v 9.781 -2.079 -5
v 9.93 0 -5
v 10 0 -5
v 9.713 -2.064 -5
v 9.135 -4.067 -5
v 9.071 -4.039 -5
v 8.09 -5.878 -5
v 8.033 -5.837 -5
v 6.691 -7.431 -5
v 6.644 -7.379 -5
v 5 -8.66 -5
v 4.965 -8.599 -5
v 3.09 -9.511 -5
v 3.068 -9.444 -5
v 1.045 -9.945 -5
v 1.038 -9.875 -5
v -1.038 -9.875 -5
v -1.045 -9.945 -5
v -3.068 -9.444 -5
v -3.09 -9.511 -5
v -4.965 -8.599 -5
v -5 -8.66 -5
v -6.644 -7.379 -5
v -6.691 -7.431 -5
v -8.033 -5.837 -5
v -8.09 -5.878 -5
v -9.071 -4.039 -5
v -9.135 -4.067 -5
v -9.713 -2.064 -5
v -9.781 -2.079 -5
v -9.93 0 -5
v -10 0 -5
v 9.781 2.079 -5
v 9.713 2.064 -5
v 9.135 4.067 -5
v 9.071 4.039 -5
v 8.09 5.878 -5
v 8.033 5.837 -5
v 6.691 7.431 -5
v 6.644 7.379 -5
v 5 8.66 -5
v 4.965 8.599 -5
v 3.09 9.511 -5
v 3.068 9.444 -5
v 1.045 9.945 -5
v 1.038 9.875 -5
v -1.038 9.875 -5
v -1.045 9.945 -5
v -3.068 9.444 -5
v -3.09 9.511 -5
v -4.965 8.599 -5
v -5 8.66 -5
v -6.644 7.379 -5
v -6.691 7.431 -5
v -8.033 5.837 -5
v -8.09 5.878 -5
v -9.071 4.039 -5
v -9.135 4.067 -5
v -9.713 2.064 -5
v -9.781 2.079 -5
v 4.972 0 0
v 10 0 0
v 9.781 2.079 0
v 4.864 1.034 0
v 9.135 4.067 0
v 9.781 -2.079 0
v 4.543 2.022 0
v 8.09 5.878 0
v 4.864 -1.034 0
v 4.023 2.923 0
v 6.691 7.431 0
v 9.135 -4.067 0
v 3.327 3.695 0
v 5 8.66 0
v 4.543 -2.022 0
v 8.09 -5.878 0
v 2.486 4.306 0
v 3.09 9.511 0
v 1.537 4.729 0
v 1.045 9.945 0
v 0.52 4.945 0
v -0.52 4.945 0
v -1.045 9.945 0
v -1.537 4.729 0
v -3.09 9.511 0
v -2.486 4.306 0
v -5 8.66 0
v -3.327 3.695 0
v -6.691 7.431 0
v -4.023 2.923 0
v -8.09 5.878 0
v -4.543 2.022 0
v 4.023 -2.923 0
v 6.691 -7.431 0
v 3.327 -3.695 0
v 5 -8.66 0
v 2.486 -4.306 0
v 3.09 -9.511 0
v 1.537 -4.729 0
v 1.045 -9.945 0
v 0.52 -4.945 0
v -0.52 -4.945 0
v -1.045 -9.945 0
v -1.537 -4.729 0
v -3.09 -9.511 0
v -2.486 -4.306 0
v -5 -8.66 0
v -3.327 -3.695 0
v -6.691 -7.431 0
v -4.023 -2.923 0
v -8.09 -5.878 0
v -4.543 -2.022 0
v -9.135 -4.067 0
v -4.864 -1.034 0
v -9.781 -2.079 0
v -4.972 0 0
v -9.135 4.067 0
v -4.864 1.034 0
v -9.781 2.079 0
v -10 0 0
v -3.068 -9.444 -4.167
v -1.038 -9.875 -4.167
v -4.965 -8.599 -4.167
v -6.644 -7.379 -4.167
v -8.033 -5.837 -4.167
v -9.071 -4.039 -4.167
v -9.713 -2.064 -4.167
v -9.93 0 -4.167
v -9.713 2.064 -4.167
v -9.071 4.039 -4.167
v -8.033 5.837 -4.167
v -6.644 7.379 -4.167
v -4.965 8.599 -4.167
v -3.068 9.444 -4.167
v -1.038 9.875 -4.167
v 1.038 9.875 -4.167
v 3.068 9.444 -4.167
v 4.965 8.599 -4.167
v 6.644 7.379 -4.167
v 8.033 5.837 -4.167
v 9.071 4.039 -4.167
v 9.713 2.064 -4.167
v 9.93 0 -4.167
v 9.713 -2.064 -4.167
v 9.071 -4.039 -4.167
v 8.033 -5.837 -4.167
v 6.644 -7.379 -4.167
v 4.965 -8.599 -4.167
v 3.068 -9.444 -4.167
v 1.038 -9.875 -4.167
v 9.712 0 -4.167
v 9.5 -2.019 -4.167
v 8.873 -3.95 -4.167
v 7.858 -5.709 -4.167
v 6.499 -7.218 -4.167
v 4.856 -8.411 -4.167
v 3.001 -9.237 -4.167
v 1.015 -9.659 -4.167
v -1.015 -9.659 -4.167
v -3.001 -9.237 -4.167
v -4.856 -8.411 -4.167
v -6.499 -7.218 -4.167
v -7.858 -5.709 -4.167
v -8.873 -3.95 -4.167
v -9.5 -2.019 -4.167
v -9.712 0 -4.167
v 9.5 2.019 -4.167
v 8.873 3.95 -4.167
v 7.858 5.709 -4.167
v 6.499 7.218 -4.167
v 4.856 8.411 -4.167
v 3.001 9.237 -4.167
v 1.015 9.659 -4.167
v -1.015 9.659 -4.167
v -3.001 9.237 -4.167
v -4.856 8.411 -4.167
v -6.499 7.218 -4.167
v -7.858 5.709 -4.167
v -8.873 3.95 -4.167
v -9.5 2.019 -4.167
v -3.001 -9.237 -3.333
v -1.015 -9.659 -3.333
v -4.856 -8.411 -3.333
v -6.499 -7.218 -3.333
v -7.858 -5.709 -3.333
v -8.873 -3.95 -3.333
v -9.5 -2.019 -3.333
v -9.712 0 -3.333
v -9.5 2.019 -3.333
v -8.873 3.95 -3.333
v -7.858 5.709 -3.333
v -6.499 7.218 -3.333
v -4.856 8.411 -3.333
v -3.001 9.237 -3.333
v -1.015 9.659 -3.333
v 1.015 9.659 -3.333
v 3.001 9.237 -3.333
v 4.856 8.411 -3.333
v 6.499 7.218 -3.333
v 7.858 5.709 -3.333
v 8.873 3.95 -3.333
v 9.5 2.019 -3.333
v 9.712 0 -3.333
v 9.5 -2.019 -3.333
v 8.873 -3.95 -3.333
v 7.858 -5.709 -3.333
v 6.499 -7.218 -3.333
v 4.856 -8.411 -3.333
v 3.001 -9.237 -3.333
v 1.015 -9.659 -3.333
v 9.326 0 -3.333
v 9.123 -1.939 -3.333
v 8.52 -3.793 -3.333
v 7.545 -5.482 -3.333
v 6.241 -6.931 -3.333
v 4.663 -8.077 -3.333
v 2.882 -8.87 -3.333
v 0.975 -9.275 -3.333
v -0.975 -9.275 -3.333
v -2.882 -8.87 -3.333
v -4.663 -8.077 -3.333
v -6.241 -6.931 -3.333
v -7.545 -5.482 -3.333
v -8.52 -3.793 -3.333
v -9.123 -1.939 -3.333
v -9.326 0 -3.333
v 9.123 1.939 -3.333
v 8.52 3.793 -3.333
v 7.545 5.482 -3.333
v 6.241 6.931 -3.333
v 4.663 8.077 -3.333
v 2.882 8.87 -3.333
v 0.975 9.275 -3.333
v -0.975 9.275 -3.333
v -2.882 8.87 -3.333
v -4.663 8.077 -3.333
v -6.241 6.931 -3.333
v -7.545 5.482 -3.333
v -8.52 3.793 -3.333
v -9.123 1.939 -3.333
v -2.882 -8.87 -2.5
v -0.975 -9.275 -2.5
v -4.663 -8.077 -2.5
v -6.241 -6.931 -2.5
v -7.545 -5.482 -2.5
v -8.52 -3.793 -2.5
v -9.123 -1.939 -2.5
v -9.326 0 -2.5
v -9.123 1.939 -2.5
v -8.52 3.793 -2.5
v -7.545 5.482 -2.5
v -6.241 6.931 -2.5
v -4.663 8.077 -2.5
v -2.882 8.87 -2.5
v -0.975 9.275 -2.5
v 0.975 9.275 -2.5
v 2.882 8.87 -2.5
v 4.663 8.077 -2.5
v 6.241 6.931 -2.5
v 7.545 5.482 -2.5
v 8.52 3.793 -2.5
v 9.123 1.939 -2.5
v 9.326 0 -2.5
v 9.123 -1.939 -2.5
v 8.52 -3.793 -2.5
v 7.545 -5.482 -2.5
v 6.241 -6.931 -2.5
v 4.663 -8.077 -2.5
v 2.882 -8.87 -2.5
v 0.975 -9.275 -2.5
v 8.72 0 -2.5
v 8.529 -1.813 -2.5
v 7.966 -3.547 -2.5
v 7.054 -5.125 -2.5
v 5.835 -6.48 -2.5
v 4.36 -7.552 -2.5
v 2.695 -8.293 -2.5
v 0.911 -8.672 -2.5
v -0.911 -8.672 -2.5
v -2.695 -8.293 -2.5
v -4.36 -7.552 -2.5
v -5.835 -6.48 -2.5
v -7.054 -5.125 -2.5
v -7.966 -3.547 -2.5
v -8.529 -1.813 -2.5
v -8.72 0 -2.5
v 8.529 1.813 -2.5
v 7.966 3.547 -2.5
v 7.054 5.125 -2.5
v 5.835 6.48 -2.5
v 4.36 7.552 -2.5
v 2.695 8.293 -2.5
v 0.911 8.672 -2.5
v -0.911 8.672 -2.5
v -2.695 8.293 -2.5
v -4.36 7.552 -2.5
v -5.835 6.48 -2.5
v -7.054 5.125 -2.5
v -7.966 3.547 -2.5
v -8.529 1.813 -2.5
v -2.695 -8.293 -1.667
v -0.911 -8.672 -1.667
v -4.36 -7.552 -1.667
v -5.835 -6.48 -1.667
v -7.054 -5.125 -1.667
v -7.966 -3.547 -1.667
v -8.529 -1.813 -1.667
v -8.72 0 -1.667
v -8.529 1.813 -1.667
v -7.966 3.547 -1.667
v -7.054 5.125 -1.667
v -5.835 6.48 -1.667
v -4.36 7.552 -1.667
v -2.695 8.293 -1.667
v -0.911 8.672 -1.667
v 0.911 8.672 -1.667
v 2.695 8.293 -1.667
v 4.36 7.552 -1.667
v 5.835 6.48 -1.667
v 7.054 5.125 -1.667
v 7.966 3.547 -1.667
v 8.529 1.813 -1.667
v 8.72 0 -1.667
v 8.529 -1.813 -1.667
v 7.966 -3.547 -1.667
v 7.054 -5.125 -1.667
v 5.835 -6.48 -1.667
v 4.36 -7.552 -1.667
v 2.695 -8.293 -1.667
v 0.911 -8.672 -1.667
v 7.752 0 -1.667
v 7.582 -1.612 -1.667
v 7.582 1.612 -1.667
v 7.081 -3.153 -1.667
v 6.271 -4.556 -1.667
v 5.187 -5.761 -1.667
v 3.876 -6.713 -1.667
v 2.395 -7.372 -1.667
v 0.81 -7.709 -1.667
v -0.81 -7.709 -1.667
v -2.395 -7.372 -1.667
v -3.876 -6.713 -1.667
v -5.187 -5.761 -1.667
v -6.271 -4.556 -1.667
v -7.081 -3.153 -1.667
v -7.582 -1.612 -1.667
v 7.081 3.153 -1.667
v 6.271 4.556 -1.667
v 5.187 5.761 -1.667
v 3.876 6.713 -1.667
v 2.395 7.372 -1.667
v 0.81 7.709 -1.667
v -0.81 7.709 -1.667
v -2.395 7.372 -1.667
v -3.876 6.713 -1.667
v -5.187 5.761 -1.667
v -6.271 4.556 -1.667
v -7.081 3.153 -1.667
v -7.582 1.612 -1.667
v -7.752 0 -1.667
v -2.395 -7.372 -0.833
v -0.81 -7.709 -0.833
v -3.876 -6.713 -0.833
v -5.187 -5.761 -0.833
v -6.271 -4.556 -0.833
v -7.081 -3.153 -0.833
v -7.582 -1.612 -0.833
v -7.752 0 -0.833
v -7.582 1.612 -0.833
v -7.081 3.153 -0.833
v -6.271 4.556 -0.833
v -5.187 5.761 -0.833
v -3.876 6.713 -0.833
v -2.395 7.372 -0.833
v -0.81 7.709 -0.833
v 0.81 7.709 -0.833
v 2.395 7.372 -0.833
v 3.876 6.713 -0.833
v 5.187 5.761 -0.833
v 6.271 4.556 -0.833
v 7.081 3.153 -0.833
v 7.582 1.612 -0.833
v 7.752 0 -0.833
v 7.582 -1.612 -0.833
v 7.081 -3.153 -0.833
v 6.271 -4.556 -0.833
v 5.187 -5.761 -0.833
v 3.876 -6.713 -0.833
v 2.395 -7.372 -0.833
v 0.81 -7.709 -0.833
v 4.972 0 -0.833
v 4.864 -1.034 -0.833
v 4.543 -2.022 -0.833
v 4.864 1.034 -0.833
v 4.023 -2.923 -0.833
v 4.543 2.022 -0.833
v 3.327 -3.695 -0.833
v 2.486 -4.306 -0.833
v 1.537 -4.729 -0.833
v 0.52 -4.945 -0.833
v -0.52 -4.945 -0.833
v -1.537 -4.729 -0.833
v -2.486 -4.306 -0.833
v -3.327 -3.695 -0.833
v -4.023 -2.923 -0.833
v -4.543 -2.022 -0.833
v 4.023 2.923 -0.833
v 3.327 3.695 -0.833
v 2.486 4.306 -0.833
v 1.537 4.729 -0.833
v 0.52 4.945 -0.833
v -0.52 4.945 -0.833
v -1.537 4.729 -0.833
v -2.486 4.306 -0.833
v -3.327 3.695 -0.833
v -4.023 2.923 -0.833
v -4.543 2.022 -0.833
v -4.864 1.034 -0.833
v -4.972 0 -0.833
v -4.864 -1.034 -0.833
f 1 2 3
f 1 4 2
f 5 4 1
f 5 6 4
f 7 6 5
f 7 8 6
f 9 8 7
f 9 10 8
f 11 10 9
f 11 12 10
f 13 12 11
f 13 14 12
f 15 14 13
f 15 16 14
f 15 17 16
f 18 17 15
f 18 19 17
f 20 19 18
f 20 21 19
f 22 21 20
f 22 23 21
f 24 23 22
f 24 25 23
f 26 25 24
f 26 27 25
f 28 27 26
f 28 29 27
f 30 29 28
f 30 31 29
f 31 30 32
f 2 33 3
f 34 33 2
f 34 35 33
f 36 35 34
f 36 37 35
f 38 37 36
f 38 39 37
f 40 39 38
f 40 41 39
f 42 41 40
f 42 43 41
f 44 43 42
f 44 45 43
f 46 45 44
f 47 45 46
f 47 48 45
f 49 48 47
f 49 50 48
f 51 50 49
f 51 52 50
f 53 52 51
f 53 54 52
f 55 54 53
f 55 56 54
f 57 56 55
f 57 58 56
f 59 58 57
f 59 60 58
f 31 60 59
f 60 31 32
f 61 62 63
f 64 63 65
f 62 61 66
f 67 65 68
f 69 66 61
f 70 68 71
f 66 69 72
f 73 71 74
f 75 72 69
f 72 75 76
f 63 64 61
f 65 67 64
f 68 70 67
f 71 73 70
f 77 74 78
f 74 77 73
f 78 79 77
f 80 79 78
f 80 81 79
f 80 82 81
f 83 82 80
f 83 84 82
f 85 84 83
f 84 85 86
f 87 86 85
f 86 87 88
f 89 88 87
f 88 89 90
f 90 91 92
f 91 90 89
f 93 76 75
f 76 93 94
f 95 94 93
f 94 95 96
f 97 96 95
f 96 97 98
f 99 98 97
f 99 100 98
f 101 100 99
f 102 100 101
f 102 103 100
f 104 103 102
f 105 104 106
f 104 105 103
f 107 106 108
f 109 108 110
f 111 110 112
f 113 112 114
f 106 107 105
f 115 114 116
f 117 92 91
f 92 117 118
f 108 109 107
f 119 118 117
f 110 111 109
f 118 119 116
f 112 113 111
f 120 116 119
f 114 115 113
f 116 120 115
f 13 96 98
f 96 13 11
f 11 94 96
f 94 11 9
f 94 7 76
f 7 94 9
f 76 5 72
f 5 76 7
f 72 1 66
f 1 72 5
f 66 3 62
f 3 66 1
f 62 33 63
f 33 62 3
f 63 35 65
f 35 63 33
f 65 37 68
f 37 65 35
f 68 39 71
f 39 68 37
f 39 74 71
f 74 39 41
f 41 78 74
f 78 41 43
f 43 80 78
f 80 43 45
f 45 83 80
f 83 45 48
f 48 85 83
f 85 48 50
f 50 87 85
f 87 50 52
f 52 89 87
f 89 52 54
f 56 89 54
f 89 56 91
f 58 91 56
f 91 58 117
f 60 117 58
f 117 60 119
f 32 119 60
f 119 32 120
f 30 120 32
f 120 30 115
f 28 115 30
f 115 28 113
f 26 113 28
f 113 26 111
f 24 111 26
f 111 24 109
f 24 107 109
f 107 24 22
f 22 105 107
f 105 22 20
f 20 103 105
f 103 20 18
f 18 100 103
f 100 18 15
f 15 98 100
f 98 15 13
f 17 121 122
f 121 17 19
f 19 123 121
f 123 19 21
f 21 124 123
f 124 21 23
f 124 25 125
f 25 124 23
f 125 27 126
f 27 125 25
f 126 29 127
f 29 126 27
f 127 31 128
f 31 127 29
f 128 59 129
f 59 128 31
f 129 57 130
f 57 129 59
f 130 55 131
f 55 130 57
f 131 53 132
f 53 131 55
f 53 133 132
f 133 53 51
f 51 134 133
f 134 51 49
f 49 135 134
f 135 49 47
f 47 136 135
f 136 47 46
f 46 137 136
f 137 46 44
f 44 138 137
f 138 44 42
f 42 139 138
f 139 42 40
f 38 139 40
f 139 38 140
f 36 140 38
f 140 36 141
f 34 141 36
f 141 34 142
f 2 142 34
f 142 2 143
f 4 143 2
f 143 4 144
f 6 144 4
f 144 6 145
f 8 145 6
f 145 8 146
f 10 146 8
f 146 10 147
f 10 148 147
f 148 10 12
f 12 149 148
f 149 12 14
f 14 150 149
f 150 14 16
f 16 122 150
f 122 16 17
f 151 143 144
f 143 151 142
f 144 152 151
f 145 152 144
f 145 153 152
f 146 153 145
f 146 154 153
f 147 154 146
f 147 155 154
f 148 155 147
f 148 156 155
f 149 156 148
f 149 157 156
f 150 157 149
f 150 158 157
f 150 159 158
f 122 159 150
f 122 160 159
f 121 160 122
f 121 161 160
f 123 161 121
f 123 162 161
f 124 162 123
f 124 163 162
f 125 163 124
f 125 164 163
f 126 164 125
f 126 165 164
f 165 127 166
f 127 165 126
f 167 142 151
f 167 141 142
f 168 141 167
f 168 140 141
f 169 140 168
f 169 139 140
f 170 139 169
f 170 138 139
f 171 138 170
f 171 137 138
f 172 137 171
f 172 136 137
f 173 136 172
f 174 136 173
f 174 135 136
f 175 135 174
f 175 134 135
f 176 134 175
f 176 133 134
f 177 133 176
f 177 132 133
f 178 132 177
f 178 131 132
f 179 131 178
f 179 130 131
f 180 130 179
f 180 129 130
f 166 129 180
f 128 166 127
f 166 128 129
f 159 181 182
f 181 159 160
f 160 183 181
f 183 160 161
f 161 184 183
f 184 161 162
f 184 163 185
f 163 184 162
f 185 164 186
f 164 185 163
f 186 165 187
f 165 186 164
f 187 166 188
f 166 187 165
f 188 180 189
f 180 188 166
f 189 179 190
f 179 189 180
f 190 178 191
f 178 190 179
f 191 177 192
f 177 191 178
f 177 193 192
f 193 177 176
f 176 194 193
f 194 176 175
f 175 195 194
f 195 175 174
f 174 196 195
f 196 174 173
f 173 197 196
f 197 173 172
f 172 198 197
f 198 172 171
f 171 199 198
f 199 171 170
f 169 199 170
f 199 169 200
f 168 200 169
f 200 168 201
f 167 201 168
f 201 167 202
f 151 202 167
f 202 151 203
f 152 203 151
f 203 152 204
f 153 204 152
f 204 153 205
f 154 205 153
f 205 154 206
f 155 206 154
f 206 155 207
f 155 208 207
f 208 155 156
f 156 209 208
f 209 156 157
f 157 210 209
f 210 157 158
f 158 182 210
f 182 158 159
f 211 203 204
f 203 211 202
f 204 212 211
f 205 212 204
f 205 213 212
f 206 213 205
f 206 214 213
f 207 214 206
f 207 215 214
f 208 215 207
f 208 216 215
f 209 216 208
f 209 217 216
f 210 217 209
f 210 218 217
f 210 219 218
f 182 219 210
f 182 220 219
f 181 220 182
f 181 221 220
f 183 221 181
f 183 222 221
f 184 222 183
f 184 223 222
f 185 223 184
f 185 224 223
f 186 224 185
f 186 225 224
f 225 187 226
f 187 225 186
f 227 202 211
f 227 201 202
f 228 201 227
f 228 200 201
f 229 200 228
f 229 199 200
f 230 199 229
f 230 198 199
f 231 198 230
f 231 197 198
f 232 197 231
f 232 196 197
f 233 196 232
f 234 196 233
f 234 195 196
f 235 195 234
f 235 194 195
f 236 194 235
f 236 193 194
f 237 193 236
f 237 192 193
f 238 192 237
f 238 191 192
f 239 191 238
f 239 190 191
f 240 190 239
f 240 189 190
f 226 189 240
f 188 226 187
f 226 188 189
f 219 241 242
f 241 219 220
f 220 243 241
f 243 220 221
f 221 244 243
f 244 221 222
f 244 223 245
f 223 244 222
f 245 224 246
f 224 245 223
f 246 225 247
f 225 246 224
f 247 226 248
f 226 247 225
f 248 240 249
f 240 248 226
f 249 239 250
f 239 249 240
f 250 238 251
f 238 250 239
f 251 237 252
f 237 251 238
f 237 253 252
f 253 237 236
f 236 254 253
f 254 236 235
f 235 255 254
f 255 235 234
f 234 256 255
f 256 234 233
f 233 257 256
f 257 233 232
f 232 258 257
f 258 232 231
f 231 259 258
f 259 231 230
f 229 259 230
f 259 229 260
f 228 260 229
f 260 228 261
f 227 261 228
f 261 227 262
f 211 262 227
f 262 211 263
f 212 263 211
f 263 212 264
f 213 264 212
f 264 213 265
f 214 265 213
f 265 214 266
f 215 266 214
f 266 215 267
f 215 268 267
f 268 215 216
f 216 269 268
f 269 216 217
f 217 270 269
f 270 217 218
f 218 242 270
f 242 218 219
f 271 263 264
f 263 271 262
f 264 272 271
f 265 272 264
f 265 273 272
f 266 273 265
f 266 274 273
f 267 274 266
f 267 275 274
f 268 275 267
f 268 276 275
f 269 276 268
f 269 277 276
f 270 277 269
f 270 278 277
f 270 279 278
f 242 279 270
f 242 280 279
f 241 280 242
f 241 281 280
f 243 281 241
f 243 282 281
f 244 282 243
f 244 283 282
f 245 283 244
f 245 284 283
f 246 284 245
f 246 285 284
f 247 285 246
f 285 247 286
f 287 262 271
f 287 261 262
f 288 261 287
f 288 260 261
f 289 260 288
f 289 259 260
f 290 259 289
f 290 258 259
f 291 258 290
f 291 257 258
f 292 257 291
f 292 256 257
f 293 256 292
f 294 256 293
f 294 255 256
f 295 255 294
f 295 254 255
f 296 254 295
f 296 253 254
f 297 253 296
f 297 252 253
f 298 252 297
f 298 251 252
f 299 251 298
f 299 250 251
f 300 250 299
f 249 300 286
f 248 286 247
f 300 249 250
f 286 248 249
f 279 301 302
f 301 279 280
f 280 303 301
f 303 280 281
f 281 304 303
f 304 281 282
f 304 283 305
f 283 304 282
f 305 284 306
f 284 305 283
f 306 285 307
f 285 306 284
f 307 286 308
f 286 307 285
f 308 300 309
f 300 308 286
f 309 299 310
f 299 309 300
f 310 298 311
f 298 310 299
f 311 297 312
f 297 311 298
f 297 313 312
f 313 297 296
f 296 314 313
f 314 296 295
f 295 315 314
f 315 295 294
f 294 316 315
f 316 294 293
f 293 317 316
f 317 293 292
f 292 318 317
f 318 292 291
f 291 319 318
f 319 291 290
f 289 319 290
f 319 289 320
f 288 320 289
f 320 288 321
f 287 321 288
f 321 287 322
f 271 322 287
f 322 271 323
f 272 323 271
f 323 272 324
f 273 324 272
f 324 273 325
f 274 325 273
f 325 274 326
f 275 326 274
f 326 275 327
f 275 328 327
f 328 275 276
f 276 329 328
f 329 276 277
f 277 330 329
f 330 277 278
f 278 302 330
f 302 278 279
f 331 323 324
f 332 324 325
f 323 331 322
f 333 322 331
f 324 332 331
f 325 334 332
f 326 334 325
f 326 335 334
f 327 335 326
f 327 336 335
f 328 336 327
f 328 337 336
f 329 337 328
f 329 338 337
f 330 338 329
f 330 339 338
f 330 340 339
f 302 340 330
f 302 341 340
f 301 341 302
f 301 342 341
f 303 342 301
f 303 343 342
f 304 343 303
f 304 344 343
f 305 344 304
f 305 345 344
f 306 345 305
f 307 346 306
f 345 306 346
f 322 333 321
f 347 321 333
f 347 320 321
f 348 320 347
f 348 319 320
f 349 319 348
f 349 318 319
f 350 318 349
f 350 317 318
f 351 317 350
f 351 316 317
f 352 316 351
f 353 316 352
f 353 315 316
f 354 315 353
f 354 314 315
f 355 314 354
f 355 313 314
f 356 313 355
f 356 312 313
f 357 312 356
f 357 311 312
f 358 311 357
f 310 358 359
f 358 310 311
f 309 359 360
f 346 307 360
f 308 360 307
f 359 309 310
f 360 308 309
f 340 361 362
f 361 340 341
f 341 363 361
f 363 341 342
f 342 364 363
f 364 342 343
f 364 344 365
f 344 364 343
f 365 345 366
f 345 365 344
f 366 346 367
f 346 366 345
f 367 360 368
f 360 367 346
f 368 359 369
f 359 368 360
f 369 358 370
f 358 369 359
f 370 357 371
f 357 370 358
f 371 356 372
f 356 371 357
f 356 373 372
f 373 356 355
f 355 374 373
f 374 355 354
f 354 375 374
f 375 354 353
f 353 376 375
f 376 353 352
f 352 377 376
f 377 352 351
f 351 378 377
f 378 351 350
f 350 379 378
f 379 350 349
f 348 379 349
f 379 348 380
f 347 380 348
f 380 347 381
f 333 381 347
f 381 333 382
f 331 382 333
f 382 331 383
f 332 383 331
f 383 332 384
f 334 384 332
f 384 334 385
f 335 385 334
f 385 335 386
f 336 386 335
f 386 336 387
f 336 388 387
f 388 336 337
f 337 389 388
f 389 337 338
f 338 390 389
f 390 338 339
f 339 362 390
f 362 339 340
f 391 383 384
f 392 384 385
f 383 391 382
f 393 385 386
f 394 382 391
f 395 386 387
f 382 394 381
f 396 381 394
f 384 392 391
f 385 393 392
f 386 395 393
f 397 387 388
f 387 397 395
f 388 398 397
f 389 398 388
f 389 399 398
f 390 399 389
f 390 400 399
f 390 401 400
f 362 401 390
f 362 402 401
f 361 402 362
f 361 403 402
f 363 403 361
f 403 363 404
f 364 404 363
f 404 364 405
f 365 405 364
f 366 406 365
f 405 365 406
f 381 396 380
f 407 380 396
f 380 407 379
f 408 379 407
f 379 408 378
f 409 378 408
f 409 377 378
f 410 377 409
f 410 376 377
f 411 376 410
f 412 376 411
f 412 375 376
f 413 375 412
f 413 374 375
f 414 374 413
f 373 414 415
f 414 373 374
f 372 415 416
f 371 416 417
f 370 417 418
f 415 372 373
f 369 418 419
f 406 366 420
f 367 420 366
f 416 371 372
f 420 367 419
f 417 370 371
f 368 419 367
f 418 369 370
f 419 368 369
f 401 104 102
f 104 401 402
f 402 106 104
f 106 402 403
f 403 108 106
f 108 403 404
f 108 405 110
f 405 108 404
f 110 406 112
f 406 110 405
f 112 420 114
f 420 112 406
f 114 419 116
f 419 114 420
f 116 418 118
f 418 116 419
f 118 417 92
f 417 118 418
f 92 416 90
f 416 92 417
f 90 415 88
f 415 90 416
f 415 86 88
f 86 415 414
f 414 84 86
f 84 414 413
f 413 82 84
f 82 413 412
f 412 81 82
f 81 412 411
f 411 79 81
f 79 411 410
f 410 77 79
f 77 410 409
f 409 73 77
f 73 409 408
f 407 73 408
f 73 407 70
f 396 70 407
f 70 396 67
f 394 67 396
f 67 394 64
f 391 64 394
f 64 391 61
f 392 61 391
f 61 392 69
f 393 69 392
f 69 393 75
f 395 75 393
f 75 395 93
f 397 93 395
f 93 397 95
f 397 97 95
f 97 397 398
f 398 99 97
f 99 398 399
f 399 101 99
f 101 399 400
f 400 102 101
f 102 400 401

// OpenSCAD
union() {
    union() {
        translate(v=[0, 0, -5]) {
            linear_extrude(height=5) {
                difference() {
                    offset(r=0) {
                        circle(r=10);
                    };
                    offset(r=-0.06993351408365323) {
                        circle(r=10);
                    };
                };
            };
        };
        translate(v=[0, 0, -4.166666666666667]) {
            linear_extrude(height=4.166666666666667) {
                difference() {
                    offset(r=-0.06993351408365323) {
                        circle(r=10);
                    };
                    offset(r=-0.2859547920896832) {
                        circle(r=10);
                    };
                };
            };
        };
        translate(v=[0, 0, -3.333333333333333]) {
            linear_extrude(height=3.333333333333333) {
                difference() {
                    offset(r=-0.2859547920896832) {
                        circle(r=10);
                    };
                    offset(r=-0.669872981077807) {
                        circle(r=10);
                    };
                };
            };
        };
        translate(v=[0, 0, -2.5]) {
            linear_extrude(height=2.5) {
                difference() {
                    offset(r=-0.669872981077807) {
                        circle(r=10);
                    };
                    offset(r=-1.2732200375003506) {
                        circle(r=10);
                    };
                };
            };
        };
        translate(v=[0, 0, -1.6666666666666665]) {
            linear_extrude(height=1.6666666666666665) {
                difference() {
                    offset(r=-1.2732200375003506) {
                        circle(r=10);
                    };
                    offset(r=-2.236146008037167) {
                        circle(r=10);
                    };
                };
            };
        };
        translate(v=[0, 0, -0.833333333333333]) {
            linear_extrude(height=0.833333333333333) {
                difference() {
                    offset(r=-2.236146008037167) {
                        circle(r=10);
                    };
                    offset(r=-5) {
                        circle(r=10);
                    };
                };
            };
        };
    };
    %difference() {
        translate(v=[0, 0, -2.5]) {
            cube(size=[25, 25, 5], center=true);
        };
        cylinder(r=10, h=20, center=true);
    };
};
